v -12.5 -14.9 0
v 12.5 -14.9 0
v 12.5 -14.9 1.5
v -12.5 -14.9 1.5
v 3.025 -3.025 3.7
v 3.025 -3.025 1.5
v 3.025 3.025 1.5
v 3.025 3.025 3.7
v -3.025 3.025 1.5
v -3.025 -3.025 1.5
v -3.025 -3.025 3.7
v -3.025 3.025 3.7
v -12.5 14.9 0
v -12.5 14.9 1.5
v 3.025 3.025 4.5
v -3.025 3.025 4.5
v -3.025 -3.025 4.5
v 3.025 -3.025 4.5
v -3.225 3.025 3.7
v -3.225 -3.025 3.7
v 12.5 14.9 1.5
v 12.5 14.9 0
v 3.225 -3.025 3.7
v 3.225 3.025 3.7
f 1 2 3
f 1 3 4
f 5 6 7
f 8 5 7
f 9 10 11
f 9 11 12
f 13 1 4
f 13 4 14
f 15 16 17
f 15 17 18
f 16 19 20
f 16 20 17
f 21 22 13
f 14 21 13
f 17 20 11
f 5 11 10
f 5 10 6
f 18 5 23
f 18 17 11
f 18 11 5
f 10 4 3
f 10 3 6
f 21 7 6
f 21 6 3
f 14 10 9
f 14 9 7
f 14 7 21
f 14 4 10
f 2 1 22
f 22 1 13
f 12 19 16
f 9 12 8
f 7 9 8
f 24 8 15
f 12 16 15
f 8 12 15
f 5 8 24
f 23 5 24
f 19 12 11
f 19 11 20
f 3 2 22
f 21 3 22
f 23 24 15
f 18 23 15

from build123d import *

# Parameters (mm, degrees)
SKETCH2_W           = 29.8
SKETCH2_H           = 25
BOSS_EXTRUDE1_DEPTH = 1.5
SKETCH3_W           = 6.05
SKETCH3_H           = 6.05
BOSS_EXTRUDE2_DEPTH = 3
BOSS_EXTRUDE3_DEPTH = 6.05


with BuildPart() as part:
    # Sketch2 → Boss-Extrude1 (new body)
    with BuildSketch(Plane(origin=(0, 0, 0), x_dir=(0, 1, 0), z_dir=(0, 0, 1))):
        Rectangle(SKETCH2_W, SKETCH2_H)
    extrude(amount=BOSS_EXTRUDE1_DEPTH)

    # Sketch3 → Boss-Extrude2 (add)
    with BuildSketch(Plane.XY.offset(1.5)):
        Rectangle(SKETCH3_W, SKETCH3_H)
    extrude(amount=BOSS_EXTRUDE2_DEPTH)

    # Sketch4 → Boss-Extrude3 (add)
    with BuildSketch(Plane(origin=(0, 3.025, 0), x_dir=(-1, 0, 0), z_dir=(0, 1, 0))):
        Polygon((-3.025, 4.5), (-3.025, 3.7), (-3.225, 3.7), align=None)
        Polygon((3.225, 3.7), (3.025, 4.5), (3.025, 3.7), align=None)
    extrude(amount=-BOSS_EXTRUDE3_DEPTH)


solid = part.part
